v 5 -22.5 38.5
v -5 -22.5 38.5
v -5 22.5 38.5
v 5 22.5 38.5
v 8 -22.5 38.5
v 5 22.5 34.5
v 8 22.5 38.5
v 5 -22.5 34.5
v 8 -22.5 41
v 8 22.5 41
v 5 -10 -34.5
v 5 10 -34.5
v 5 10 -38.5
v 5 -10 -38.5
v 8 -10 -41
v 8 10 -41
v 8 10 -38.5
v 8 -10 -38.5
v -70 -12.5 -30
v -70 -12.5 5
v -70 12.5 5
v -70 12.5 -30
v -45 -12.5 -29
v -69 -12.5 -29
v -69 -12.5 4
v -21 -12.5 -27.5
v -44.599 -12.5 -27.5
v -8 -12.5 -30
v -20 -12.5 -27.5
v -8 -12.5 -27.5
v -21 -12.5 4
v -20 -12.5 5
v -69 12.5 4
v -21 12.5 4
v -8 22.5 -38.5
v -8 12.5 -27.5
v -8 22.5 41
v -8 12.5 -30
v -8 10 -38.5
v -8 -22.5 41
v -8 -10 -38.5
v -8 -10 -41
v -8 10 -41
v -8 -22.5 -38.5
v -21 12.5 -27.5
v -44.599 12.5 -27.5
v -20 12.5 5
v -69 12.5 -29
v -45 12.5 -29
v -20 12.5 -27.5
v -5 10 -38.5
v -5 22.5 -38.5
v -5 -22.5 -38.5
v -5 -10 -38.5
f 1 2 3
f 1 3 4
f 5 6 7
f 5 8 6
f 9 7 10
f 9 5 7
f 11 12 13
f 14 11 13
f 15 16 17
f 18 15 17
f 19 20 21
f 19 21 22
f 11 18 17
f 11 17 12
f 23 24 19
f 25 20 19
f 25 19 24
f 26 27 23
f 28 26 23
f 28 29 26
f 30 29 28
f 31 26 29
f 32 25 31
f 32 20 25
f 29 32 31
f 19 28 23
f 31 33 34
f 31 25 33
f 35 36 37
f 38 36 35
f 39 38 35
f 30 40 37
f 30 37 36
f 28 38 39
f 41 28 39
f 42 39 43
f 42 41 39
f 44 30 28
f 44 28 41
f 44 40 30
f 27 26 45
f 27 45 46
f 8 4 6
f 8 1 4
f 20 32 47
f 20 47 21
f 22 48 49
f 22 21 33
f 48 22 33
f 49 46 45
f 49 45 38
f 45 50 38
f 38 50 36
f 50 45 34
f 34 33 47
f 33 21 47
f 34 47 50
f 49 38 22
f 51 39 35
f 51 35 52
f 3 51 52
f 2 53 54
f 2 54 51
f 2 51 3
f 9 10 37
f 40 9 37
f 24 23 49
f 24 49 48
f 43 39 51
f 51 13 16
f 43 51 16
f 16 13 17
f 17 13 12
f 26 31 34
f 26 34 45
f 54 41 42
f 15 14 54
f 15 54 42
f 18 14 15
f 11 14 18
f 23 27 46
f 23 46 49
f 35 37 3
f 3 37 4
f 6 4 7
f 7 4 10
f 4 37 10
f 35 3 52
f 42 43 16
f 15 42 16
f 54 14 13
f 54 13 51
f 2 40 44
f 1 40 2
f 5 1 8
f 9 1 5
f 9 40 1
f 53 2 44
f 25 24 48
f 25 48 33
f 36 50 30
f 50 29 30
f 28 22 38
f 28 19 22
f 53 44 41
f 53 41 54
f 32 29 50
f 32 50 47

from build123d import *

# Parameters (mm, degrees)
F1_DEPTH = 22.5
F2_DEPTH = 10
F0_W     = 12
F0_H     = 2.5
F3_DEPTH = 12.5
F4_DEPTH = 12.5
F5_DEPTH = 12.5


# Not quite as in the source:
# - a feature names something its author has since deleted; it is built from what else it names


with BuildPart() as f1:
    # F0 (on Front) → F1 (new body, symmetric)
    with BuildSketch(Plane.XZ):
        Polygon((8, 38.5), (8, 41), (-8, 41), (-8, 8), (-8, -27.5), (-8, -30), (-8, -38.5), (-5, -38.5), (-5, 38.5), (5, 38.5), (5, 34.5), align=None)
    extrude(amount=F1_DEPTH, both=True)

    # F0 (on Front) → F2 (join, symmetric)
    with BuildSketch(Plane.XZ):
        Polygon((-5, -38.5), (-8, -38.5), (-8, -41), (8, -41), (8, -38.5), (5, -34.5), (5, -38.5), align=None)
    extrude(amount=F2_DEPTH, both=True)

    # F0 (on Front) → F3 (join, symmetric)
    with BuildSketch(Plane.XZ):
        with Locations((-14, -28.75)):
            Rectangle(F0_W, F0_H)
    extrude(amount=F3_DEPTH, both=True)

    # F0 (on Front) → F4 (join, symmetric)
    with BuildSketch(Plane.XZ):
        Polygon((-20, -30), (-20, -27.5), (-20, 5), (-70, 5), (-70, -30), (-44.4338369071, -30), align=None)
        Polygon((-21, 4), (-21, -27.5), (-21, -29), (-45, -29), (-69, -29), (-69, 4), align=None, mode=Mode.SUBTRACT)
    extrude(amount=F4_DEPTH, both=True)

    # F0 (on Front) → F5 (join, symmetric)
    with BuildSketch(Plane.XZ):
        Polygon((-21, -29), (-21, -27.5), (-44.5986762643, -27.5), (-45, -29), align=None)
    extrude(amount=F5_DEPTH, both=True)


solid = f1.part
